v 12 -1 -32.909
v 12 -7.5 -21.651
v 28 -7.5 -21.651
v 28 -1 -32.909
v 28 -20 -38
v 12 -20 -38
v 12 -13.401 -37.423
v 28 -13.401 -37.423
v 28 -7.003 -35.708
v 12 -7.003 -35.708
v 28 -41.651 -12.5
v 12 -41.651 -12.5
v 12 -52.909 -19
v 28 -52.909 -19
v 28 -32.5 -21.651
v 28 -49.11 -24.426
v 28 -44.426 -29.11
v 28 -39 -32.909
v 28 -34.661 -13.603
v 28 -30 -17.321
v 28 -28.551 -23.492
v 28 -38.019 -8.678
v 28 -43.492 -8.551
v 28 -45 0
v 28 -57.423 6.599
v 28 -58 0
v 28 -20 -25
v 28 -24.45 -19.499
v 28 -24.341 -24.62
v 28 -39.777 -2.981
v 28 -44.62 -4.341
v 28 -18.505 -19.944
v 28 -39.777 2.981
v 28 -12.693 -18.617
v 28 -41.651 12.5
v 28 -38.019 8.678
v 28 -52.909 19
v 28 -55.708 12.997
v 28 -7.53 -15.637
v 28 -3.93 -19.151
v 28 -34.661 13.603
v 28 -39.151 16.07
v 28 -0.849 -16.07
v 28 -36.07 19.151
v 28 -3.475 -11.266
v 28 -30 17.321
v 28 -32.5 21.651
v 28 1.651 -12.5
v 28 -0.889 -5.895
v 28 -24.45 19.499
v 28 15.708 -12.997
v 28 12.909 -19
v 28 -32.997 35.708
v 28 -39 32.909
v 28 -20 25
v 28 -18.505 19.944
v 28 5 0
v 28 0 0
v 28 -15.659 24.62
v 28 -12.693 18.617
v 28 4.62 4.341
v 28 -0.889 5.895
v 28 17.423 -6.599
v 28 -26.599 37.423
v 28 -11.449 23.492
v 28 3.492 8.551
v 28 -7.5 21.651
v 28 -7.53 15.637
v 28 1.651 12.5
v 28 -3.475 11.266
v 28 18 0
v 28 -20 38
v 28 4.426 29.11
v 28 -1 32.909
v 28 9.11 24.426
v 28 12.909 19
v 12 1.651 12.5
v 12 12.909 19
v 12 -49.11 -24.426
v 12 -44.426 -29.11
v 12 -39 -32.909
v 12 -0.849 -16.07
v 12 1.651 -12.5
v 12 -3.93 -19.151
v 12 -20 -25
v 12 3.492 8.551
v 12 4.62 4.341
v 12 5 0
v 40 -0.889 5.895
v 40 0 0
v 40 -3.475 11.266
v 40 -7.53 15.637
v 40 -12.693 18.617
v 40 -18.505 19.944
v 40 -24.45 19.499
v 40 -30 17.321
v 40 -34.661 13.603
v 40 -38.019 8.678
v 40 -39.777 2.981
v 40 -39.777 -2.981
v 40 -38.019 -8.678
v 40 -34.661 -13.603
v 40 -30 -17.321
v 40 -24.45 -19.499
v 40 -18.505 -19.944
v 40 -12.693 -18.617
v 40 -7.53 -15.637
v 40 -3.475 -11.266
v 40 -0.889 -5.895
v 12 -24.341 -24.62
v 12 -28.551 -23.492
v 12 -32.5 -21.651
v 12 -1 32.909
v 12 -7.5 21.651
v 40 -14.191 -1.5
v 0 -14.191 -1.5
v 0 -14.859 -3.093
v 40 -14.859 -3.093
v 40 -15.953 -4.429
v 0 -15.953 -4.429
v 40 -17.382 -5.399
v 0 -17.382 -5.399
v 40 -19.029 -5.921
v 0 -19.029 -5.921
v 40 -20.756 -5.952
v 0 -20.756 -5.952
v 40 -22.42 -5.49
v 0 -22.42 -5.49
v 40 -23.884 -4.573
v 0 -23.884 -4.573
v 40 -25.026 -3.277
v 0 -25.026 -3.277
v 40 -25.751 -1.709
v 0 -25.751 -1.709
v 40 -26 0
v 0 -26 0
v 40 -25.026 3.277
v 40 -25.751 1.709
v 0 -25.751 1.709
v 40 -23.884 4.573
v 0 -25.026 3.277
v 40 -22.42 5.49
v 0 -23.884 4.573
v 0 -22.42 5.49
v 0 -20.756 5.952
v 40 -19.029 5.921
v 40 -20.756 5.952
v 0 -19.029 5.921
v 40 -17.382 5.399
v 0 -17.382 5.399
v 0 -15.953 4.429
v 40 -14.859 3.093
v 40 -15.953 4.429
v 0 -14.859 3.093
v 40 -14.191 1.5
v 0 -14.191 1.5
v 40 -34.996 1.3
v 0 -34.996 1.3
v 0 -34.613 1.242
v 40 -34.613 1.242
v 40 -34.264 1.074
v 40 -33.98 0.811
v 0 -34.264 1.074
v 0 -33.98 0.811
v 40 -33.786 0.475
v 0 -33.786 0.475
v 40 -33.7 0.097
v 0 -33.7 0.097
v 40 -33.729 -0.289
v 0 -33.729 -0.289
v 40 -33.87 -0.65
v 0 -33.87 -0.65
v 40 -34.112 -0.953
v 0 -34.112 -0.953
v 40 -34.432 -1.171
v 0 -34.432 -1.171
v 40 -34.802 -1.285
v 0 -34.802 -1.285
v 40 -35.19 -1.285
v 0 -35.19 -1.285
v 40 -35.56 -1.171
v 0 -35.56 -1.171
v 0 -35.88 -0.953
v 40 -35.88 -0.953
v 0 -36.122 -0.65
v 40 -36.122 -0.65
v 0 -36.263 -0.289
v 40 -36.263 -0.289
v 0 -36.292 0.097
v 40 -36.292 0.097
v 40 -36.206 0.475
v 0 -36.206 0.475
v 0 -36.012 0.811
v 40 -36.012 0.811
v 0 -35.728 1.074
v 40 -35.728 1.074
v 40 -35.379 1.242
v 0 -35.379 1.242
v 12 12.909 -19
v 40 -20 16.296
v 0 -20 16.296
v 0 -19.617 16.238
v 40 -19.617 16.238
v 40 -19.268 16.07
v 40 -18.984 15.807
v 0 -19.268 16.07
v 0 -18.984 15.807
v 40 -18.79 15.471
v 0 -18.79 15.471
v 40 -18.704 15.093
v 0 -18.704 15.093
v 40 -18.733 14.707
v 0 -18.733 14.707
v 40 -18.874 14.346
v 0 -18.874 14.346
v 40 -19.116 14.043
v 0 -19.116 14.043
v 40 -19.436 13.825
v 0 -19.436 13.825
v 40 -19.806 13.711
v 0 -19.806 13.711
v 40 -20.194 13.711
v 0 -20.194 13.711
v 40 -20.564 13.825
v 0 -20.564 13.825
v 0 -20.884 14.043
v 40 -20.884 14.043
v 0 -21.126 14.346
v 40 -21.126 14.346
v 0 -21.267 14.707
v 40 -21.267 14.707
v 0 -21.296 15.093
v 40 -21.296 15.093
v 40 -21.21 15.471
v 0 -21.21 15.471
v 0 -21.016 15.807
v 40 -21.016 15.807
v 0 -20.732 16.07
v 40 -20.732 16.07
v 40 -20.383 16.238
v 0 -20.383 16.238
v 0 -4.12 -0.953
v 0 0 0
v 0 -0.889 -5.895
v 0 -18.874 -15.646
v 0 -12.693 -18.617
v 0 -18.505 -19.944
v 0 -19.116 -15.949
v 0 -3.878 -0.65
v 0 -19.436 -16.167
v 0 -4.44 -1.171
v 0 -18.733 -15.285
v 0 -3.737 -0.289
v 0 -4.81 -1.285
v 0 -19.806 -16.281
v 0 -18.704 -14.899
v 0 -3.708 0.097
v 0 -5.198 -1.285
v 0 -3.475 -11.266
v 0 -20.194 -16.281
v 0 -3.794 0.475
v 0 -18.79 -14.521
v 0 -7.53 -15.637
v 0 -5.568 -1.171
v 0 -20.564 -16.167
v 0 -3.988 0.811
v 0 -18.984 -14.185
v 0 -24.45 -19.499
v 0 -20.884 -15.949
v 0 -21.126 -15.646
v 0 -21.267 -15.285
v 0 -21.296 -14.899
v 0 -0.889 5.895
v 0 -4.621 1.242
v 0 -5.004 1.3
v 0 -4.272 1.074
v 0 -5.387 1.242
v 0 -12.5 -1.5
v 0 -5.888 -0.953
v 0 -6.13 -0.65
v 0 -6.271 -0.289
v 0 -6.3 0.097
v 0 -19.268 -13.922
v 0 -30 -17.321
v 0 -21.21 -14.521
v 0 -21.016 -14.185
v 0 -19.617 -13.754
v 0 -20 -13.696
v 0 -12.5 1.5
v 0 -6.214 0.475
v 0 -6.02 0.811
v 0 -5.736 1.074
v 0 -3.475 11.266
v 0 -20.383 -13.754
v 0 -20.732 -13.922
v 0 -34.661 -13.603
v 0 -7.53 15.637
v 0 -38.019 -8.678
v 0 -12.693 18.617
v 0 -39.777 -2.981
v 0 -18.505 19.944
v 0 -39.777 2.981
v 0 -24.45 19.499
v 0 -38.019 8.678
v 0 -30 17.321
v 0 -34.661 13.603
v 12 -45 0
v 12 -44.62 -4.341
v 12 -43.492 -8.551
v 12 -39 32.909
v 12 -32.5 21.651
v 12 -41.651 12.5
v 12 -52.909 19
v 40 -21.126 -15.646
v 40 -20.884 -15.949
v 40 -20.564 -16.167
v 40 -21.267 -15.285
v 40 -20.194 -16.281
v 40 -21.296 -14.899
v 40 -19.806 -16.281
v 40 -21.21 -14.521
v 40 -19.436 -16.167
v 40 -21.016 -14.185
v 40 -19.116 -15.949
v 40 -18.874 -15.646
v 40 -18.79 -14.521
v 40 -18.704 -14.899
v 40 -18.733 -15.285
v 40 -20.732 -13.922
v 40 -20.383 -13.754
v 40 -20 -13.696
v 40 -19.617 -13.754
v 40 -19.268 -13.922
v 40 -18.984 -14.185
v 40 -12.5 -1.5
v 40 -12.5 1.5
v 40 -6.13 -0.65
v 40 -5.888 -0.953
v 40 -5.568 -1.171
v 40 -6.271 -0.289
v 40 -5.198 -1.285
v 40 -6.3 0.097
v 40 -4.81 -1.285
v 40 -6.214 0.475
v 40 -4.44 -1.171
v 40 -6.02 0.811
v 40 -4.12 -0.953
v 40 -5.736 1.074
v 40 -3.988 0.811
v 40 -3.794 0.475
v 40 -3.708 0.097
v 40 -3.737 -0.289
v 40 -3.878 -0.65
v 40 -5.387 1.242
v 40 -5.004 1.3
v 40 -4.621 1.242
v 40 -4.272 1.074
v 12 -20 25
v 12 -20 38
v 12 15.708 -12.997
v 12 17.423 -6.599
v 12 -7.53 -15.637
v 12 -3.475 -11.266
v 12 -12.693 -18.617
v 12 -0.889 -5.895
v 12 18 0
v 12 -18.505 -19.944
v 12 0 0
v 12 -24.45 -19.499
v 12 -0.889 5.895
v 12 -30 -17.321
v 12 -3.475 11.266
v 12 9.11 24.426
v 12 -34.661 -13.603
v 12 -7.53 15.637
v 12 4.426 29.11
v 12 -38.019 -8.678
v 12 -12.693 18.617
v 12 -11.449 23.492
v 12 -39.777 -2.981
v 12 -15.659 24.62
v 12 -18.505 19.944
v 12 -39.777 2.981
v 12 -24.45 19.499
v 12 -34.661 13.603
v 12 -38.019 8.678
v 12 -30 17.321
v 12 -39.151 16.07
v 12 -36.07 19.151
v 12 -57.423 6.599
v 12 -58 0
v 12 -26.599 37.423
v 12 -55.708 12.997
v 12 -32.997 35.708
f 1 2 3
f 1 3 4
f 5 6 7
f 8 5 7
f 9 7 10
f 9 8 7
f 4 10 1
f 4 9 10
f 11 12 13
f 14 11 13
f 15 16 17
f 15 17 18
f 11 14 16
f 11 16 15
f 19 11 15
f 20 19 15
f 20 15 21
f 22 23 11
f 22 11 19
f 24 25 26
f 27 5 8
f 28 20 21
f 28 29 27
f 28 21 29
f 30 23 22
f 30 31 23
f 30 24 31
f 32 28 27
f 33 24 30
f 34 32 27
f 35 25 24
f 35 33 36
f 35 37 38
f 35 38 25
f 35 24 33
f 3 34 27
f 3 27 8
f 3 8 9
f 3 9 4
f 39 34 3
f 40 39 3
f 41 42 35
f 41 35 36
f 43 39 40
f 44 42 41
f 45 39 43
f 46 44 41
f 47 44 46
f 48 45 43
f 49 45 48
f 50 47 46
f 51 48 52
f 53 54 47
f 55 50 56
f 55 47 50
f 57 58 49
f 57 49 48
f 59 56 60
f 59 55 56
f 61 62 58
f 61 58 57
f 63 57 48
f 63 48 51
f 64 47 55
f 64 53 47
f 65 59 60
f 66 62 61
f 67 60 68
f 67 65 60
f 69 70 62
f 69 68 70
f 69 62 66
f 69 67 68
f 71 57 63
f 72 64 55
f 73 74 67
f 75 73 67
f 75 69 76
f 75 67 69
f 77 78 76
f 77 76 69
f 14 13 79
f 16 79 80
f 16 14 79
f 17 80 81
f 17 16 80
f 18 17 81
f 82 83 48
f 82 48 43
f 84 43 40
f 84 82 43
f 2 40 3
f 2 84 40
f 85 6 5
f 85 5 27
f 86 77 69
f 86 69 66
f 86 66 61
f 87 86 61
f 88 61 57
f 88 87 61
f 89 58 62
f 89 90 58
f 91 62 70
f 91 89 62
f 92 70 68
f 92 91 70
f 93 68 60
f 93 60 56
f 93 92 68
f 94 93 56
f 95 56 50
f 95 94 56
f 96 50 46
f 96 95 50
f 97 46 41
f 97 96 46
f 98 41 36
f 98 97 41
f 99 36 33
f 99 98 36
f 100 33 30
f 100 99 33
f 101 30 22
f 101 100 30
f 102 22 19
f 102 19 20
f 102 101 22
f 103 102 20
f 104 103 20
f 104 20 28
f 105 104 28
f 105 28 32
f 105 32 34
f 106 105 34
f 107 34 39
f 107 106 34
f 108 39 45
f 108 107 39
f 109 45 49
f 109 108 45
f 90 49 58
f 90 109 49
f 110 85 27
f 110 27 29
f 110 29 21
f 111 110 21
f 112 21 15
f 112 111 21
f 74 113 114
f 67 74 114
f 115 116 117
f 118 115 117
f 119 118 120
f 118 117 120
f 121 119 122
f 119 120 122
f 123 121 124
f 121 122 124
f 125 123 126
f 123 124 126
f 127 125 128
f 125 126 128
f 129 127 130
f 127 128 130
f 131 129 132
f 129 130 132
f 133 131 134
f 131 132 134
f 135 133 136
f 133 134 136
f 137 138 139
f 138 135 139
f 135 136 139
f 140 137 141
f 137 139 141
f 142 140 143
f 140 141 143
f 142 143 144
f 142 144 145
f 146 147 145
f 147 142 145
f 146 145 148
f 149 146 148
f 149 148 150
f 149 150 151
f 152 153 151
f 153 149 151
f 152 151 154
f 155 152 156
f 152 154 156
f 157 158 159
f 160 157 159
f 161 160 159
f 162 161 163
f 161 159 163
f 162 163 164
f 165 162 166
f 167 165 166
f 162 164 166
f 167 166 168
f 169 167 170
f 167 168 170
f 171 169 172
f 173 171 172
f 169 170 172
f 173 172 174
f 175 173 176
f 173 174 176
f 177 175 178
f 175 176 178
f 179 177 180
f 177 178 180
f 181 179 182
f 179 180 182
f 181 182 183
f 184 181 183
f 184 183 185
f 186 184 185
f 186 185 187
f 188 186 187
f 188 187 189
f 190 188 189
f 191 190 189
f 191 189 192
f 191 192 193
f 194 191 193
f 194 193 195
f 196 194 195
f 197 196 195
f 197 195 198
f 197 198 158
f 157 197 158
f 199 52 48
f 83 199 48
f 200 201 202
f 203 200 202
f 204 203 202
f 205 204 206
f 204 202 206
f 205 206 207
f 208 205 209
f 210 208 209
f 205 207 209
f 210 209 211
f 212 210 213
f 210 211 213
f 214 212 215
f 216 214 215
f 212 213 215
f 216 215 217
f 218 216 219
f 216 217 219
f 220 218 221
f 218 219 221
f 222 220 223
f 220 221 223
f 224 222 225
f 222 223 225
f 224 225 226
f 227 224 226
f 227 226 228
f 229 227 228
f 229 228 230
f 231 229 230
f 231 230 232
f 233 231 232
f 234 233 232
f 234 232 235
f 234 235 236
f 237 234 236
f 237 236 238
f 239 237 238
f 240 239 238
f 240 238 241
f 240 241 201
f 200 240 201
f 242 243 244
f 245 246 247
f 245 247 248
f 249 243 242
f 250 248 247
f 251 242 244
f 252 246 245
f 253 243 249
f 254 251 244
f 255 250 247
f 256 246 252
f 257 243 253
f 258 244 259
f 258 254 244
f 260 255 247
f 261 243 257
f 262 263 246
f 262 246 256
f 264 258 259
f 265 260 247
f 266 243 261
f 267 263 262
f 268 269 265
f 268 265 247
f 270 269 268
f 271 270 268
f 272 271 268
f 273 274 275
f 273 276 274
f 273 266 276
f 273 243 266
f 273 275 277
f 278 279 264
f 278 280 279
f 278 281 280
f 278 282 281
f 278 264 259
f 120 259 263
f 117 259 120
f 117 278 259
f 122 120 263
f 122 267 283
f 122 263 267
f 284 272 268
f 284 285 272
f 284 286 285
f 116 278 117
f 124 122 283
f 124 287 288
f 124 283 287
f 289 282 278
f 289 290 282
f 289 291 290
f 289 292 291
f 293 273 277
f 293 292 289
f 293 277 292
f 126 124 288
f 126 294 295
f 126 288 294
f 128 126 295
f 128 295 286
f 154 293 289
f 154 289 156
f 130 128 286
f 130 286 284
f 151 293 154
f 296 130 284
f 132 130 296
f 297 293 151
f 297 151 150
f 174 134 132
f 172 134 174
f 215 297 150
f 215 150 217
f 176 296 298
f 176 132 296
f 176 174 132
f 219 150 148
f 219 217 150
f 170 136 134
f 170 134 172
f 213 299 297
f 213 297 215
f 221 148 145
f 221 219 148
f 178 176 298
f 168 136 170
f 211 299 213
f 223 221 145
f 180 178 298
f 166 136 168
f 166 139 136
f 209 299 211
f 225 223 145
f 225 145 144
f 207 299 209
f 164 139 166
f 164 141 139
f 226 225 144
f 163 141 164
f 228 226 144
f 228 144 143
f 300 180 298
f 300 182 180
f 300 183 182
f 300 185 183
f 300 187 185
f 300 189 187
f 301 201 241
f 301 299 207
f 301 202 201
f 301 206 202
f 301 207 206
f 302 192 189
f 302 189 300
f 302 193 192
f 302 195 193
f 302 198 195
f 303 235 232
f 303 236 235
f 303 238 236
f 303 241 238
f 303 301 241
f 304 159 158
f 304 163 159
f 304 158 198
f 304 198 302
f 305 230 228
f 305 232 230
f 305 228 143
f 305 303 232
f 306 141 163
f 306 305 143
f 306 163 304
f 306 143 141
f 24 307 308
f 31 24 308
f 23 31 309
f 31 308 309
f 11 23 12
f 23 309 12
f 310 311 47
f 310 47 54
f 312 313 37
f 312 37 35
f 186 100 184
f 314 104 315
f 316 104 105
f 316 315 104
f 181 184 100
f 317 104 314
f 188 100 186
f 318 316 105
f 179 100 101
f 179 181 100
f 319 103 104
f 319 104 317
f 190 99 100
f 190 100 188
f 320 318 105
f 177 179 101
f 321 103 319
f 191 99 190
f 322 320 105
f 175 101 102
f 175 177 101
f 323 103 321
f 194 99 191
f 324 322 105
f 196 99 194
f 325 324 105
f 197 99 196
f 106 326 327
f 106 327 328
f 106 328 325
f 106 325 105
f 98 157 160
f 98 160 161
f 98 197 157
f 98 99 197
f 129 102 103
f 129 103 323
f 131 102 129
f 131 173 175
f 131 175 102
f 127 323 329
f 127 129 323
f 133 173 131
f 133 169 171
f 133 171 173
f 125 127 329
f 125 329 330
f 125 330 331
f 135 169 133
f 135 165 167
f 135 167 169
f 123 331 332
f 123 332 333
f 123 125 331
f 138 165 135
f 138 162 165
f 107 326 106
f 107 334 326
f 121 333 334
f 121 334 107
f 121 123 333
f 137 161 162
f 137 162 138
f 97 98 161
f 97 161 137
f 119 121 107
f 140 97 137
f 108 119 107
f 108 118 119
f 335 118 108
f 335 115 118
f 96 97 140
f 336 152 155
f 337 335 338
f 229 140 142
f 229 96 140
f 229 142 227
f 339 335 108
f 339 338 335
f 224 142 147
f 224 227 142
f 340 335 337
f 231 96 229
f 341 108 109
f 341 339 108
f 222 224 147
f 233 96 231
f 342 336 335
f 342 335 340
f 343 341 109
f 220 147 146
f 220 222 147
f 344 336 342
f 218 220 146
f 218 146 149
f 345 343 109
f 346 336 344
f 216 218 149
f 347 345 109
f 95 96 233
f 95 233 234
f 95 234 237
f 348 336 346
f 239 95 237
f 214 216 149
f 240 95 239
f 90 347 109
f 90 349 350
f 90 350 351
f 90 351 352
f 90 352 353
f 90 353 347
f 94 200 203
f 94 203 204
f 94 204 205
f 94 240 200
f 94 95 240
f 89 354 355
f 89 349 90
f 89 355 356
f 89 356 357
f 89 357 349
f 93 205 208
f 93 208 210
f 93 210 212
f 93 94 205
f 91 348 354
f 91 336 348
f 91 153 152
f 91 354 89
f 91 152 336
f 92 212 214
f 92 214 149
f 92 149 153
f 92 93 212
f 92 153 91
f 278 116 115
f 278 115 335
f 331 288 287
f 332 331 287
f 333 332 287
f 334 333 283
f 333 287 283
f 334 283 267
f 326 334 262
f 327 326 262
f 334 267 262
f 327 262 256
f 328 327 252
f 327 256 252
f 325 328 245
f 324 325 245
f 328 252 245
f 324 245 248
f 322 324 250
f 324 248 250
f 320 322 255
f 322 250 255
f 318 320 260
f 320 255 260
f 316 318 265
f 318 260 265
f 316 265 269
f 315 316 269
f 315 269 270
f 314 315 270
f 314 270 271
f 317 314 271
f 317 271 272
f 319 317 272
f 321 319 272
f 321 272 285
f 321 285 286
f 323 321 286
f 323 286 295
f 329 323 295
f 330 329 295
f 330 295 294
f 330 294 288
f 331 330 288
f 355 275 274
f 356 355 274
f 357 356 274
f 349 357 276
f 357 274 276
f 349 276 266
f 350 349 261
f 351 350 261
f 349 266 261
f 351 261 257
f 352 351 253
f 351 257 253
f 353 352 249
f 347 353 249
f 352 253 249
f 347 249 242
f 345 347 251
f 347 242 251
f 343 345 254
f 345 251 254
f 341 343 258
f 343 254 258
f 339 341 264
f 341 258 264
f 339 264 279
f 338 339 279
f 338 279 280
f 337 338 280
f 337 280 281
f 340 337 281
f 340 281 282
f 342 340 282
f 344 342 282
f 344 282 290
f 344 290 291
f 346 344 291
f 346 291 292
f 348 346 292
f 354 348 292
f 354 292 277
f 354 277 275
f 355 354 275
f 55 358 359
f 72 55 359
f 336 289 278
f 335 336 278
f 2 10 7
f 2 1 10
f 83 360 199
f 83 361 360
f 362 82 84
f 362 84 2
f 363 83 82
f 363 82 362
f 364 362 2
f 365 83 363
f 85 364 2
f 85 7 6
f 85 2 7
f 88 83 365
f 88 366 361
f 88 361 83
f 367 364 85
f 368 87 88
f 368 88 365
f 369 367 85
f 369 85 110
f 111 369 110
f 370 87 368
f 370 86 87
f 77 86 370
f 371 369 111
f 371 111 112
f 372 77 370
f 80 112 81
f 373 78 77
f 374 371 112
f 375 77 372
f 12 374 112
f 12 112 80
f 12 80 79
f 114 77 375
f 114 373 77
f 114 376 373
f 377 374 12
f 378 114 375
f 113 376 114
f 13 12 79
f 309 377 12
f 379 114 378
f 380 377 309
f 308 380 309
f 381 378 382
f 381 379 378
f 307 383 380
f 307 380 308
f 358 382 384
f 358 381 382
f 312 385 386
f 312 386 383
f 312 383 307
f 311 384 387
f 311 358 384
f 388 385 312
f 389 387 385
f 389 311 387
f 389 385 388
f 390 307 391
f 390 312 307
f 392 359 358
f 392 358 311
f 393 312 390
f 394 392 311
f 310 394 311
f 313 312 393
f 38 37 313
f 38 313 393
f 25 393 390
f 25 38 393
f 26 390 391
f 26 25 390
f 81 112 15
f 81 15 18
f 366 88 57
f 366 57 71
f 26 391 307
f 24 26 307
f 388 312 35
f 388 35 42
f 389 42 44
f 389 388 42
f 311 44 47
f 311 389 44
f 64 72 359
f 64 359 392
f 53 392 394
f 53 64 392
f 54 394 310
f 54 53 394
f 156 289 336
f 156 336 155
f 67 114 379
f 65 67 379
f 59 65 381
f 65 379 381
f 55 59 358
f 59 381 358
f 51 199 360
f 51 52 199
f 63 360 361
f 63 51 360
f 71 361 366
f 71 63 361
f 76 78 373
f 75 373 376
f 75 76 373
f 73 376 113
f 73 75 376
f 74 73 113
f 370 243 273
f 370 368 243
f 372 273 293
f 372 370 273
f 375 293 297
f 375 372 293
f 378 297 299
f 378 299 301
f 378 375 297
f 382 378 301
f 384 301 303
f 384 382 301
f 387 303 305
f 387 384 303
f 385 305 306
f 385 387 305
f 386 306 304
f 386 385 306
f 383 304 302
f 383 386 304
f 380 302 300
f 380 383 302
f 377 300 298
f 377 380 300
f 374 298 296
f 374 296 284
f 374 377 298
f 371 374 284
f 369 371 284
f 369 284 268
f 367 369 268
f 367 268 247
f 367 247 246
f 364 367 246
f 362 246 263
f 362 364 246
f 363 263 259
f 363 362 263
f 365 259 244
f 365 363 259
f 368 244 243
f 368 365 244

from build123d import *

# Parameters (mm, degrees)
ESBO_O2_R             = 6
CORTE_EXTRUS_O1_DEPTH = 41
CORTE_EXTRUS_O7_DEPTH = 41
CORTE_EXTRUS_O8_DEPTH = 29
ESBO_O10_R            = 1.3
CORTE_EXTRUS_O9_DEPTH = 41


with BuildPart() as part:
    # Esboço1 → Revolução1 (revolve)
    with BuildSketch(Plane.XY):
        Polygon((0, 0), (12, 0), (12, 18), (28, 18), (28, 0), (40, 0), (40, -20), (0, -20), align=None)
    revolve(axis=Axis((0, -20, 0), (1, 0, 0)))

    # Esboço2 → Corte-extrusão1 (cut, through all)
    with BuildSketch(Plane.ZY):
        with Locations((0, -20)):
            Circle(ESBO_O2_R)
    extrude(amount=-CORTE_EXTRUS_O1_DEPTH, mode=Mode.SUBTRACT)

    # Esboço8 → Corte-extrusão7 (cut, through all)
    with BuildSketch(Plane.ZY):
        Polygon((0, -12.5), (1.5, -12.5), (1.5, -14.653499006), (-1.5, -14.653499006), (-1.5, -12.5), align=None)
    extrude(amount=-CORTE_EXTRUS_O7_DEPTH, mode=Mode.SUBTRACT)

    # Esboço9 → Corte-extrusão8 (cut, through all)
    with BuildSketch(Plane.ZY.offset(-12)):
        with BuildLine():
            Line((0, -58), (0, -45))
            ThreePointArc((0, -45), (-6.470476128, -44.148145657), (-12.5, -41.650635095))
            Line((-12.5, -41.650635095), (-19, -52.908965344))
            ThreePointArc((-19, -52.908965344), (-9.835123714, -56.705181399), (0, -58))
        make_face()
        with BuildLine():
            Line((19, 12.908965344), (12.5, 1.650635095))
            ThreePointArc((12.5, 1.650635095), (6.470476128, 4.148145657), (0, 5))
            Line((0, 5), (0, 18))
            ThreePointArc((0, 18), (9.835123714, 16.705181399), (19, 12.908965344))
        make_face()
        with BuildLine():
            Line((-19, 12.908965344), (-12.5, 1.650635095))
            ThreePointArc((-12.5, 1.650635095), (-17.67766953, -2.32233047), (-21.650635095, -7.5))
            Line((-21.650635095, -7.5), (-32.908965344, -1))
            ThreePointArc((-32.908965344, -1), (-26.870057685, 6.870057685), (-19, 12.908965344))
        make_face()
        with BuildLine():
            Line((32.908965344, -1), (21.650635095, -7.5))
            ThreePointArc((21.650635095, -7.5), (24.148145657, -13.529523872), (25, -20))
            Line((25, -20), (38, -20))
            ThreePointArc((38, -20), (36.705181399, -10.164876286), (32.908965344, -1))
        make_face()
        with BuildLine():
            Line((19, -52.908965344), (12.5, -41.650635095))
            ThreePointArc((12.5, -41.650635095), (17.67766953, -37.67766953), (21.650635095, -32.5))
            Line((21.650635095, -32.5), (32.908965344, -39))
            ThreePointArc((32.908965344, -39), (26.870057685, -46.870057685), (19, -52.908965344))
        make_face()
        with BuildLine():
            Line((-38, -20), (-25, -20))
            ThreePointArc((-25, -20), (-24.148145657, -26.470476128), (-21.650635095, -32.5))
            Line((-21.650635095, -32.5), (-32.908965344, -39))
            ThreePointArc((-32.908965344, -39), (-36.705181399, -29.835123714), (-38, -20))
        make_face()
    extrude(amount=-CORTE_EXTRUS_O8_DEPTH, mode=Mode.SUBTRACT)

    # Esboço10 → Corte-extrusão9 (cut, through all)
    with BuildSketch(Plane.ZY):
        with Locations((0, -5.003986953)):
            Circle(ESBO_O10_R)
        with Locations((14.996013047, -20)):
            Circle(ESBO_O10_R)
        with Locations((0, -34.996013047)):
            Circle(ESBO_O10_R)
        with Locations((-14.996013047, -20)):
            Circle(ESBO_O10_R)
    extrude(amount=-CORTE_EXTRUS_O9_DEPTH, mode=Mode.SUBTRACT)


solid = part.part
